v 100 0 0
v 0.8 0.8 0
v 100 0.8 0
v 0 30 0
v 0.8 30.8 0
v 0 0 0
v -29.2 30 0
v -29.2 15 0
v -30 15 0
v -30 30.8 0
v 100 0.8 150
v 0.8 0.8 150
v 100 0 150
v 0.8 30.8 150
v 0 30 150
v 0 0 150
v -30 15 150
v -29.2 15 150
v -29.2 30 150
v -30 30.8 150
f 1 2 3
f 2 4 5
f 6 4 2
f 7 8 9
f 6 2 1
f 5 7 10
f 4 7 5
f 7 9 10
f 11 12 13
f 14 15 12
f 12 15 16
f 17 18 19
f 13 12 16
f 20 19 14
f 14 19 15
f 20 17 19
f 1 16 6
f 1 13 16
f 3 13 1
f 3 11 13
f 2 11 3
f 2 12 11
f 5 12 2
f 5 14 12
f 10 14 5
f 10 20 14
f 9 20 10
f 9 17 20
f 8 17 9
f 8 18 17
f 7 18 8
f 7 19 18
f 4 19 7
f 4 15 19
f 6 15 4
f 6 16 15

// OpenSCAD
thickness = 0.8;
book_thick = 30;
book_edge = 30;

linear_extrude(150){
square([100, thickness]);
square([thickness, book_edge]);

translate([-book_thick,book_edge,0])
square([book_thick+thickness, thickness]);

translate([-book_thick,book_edge/2,0])
square([thickness, book_edge/2+thickness]);
}
